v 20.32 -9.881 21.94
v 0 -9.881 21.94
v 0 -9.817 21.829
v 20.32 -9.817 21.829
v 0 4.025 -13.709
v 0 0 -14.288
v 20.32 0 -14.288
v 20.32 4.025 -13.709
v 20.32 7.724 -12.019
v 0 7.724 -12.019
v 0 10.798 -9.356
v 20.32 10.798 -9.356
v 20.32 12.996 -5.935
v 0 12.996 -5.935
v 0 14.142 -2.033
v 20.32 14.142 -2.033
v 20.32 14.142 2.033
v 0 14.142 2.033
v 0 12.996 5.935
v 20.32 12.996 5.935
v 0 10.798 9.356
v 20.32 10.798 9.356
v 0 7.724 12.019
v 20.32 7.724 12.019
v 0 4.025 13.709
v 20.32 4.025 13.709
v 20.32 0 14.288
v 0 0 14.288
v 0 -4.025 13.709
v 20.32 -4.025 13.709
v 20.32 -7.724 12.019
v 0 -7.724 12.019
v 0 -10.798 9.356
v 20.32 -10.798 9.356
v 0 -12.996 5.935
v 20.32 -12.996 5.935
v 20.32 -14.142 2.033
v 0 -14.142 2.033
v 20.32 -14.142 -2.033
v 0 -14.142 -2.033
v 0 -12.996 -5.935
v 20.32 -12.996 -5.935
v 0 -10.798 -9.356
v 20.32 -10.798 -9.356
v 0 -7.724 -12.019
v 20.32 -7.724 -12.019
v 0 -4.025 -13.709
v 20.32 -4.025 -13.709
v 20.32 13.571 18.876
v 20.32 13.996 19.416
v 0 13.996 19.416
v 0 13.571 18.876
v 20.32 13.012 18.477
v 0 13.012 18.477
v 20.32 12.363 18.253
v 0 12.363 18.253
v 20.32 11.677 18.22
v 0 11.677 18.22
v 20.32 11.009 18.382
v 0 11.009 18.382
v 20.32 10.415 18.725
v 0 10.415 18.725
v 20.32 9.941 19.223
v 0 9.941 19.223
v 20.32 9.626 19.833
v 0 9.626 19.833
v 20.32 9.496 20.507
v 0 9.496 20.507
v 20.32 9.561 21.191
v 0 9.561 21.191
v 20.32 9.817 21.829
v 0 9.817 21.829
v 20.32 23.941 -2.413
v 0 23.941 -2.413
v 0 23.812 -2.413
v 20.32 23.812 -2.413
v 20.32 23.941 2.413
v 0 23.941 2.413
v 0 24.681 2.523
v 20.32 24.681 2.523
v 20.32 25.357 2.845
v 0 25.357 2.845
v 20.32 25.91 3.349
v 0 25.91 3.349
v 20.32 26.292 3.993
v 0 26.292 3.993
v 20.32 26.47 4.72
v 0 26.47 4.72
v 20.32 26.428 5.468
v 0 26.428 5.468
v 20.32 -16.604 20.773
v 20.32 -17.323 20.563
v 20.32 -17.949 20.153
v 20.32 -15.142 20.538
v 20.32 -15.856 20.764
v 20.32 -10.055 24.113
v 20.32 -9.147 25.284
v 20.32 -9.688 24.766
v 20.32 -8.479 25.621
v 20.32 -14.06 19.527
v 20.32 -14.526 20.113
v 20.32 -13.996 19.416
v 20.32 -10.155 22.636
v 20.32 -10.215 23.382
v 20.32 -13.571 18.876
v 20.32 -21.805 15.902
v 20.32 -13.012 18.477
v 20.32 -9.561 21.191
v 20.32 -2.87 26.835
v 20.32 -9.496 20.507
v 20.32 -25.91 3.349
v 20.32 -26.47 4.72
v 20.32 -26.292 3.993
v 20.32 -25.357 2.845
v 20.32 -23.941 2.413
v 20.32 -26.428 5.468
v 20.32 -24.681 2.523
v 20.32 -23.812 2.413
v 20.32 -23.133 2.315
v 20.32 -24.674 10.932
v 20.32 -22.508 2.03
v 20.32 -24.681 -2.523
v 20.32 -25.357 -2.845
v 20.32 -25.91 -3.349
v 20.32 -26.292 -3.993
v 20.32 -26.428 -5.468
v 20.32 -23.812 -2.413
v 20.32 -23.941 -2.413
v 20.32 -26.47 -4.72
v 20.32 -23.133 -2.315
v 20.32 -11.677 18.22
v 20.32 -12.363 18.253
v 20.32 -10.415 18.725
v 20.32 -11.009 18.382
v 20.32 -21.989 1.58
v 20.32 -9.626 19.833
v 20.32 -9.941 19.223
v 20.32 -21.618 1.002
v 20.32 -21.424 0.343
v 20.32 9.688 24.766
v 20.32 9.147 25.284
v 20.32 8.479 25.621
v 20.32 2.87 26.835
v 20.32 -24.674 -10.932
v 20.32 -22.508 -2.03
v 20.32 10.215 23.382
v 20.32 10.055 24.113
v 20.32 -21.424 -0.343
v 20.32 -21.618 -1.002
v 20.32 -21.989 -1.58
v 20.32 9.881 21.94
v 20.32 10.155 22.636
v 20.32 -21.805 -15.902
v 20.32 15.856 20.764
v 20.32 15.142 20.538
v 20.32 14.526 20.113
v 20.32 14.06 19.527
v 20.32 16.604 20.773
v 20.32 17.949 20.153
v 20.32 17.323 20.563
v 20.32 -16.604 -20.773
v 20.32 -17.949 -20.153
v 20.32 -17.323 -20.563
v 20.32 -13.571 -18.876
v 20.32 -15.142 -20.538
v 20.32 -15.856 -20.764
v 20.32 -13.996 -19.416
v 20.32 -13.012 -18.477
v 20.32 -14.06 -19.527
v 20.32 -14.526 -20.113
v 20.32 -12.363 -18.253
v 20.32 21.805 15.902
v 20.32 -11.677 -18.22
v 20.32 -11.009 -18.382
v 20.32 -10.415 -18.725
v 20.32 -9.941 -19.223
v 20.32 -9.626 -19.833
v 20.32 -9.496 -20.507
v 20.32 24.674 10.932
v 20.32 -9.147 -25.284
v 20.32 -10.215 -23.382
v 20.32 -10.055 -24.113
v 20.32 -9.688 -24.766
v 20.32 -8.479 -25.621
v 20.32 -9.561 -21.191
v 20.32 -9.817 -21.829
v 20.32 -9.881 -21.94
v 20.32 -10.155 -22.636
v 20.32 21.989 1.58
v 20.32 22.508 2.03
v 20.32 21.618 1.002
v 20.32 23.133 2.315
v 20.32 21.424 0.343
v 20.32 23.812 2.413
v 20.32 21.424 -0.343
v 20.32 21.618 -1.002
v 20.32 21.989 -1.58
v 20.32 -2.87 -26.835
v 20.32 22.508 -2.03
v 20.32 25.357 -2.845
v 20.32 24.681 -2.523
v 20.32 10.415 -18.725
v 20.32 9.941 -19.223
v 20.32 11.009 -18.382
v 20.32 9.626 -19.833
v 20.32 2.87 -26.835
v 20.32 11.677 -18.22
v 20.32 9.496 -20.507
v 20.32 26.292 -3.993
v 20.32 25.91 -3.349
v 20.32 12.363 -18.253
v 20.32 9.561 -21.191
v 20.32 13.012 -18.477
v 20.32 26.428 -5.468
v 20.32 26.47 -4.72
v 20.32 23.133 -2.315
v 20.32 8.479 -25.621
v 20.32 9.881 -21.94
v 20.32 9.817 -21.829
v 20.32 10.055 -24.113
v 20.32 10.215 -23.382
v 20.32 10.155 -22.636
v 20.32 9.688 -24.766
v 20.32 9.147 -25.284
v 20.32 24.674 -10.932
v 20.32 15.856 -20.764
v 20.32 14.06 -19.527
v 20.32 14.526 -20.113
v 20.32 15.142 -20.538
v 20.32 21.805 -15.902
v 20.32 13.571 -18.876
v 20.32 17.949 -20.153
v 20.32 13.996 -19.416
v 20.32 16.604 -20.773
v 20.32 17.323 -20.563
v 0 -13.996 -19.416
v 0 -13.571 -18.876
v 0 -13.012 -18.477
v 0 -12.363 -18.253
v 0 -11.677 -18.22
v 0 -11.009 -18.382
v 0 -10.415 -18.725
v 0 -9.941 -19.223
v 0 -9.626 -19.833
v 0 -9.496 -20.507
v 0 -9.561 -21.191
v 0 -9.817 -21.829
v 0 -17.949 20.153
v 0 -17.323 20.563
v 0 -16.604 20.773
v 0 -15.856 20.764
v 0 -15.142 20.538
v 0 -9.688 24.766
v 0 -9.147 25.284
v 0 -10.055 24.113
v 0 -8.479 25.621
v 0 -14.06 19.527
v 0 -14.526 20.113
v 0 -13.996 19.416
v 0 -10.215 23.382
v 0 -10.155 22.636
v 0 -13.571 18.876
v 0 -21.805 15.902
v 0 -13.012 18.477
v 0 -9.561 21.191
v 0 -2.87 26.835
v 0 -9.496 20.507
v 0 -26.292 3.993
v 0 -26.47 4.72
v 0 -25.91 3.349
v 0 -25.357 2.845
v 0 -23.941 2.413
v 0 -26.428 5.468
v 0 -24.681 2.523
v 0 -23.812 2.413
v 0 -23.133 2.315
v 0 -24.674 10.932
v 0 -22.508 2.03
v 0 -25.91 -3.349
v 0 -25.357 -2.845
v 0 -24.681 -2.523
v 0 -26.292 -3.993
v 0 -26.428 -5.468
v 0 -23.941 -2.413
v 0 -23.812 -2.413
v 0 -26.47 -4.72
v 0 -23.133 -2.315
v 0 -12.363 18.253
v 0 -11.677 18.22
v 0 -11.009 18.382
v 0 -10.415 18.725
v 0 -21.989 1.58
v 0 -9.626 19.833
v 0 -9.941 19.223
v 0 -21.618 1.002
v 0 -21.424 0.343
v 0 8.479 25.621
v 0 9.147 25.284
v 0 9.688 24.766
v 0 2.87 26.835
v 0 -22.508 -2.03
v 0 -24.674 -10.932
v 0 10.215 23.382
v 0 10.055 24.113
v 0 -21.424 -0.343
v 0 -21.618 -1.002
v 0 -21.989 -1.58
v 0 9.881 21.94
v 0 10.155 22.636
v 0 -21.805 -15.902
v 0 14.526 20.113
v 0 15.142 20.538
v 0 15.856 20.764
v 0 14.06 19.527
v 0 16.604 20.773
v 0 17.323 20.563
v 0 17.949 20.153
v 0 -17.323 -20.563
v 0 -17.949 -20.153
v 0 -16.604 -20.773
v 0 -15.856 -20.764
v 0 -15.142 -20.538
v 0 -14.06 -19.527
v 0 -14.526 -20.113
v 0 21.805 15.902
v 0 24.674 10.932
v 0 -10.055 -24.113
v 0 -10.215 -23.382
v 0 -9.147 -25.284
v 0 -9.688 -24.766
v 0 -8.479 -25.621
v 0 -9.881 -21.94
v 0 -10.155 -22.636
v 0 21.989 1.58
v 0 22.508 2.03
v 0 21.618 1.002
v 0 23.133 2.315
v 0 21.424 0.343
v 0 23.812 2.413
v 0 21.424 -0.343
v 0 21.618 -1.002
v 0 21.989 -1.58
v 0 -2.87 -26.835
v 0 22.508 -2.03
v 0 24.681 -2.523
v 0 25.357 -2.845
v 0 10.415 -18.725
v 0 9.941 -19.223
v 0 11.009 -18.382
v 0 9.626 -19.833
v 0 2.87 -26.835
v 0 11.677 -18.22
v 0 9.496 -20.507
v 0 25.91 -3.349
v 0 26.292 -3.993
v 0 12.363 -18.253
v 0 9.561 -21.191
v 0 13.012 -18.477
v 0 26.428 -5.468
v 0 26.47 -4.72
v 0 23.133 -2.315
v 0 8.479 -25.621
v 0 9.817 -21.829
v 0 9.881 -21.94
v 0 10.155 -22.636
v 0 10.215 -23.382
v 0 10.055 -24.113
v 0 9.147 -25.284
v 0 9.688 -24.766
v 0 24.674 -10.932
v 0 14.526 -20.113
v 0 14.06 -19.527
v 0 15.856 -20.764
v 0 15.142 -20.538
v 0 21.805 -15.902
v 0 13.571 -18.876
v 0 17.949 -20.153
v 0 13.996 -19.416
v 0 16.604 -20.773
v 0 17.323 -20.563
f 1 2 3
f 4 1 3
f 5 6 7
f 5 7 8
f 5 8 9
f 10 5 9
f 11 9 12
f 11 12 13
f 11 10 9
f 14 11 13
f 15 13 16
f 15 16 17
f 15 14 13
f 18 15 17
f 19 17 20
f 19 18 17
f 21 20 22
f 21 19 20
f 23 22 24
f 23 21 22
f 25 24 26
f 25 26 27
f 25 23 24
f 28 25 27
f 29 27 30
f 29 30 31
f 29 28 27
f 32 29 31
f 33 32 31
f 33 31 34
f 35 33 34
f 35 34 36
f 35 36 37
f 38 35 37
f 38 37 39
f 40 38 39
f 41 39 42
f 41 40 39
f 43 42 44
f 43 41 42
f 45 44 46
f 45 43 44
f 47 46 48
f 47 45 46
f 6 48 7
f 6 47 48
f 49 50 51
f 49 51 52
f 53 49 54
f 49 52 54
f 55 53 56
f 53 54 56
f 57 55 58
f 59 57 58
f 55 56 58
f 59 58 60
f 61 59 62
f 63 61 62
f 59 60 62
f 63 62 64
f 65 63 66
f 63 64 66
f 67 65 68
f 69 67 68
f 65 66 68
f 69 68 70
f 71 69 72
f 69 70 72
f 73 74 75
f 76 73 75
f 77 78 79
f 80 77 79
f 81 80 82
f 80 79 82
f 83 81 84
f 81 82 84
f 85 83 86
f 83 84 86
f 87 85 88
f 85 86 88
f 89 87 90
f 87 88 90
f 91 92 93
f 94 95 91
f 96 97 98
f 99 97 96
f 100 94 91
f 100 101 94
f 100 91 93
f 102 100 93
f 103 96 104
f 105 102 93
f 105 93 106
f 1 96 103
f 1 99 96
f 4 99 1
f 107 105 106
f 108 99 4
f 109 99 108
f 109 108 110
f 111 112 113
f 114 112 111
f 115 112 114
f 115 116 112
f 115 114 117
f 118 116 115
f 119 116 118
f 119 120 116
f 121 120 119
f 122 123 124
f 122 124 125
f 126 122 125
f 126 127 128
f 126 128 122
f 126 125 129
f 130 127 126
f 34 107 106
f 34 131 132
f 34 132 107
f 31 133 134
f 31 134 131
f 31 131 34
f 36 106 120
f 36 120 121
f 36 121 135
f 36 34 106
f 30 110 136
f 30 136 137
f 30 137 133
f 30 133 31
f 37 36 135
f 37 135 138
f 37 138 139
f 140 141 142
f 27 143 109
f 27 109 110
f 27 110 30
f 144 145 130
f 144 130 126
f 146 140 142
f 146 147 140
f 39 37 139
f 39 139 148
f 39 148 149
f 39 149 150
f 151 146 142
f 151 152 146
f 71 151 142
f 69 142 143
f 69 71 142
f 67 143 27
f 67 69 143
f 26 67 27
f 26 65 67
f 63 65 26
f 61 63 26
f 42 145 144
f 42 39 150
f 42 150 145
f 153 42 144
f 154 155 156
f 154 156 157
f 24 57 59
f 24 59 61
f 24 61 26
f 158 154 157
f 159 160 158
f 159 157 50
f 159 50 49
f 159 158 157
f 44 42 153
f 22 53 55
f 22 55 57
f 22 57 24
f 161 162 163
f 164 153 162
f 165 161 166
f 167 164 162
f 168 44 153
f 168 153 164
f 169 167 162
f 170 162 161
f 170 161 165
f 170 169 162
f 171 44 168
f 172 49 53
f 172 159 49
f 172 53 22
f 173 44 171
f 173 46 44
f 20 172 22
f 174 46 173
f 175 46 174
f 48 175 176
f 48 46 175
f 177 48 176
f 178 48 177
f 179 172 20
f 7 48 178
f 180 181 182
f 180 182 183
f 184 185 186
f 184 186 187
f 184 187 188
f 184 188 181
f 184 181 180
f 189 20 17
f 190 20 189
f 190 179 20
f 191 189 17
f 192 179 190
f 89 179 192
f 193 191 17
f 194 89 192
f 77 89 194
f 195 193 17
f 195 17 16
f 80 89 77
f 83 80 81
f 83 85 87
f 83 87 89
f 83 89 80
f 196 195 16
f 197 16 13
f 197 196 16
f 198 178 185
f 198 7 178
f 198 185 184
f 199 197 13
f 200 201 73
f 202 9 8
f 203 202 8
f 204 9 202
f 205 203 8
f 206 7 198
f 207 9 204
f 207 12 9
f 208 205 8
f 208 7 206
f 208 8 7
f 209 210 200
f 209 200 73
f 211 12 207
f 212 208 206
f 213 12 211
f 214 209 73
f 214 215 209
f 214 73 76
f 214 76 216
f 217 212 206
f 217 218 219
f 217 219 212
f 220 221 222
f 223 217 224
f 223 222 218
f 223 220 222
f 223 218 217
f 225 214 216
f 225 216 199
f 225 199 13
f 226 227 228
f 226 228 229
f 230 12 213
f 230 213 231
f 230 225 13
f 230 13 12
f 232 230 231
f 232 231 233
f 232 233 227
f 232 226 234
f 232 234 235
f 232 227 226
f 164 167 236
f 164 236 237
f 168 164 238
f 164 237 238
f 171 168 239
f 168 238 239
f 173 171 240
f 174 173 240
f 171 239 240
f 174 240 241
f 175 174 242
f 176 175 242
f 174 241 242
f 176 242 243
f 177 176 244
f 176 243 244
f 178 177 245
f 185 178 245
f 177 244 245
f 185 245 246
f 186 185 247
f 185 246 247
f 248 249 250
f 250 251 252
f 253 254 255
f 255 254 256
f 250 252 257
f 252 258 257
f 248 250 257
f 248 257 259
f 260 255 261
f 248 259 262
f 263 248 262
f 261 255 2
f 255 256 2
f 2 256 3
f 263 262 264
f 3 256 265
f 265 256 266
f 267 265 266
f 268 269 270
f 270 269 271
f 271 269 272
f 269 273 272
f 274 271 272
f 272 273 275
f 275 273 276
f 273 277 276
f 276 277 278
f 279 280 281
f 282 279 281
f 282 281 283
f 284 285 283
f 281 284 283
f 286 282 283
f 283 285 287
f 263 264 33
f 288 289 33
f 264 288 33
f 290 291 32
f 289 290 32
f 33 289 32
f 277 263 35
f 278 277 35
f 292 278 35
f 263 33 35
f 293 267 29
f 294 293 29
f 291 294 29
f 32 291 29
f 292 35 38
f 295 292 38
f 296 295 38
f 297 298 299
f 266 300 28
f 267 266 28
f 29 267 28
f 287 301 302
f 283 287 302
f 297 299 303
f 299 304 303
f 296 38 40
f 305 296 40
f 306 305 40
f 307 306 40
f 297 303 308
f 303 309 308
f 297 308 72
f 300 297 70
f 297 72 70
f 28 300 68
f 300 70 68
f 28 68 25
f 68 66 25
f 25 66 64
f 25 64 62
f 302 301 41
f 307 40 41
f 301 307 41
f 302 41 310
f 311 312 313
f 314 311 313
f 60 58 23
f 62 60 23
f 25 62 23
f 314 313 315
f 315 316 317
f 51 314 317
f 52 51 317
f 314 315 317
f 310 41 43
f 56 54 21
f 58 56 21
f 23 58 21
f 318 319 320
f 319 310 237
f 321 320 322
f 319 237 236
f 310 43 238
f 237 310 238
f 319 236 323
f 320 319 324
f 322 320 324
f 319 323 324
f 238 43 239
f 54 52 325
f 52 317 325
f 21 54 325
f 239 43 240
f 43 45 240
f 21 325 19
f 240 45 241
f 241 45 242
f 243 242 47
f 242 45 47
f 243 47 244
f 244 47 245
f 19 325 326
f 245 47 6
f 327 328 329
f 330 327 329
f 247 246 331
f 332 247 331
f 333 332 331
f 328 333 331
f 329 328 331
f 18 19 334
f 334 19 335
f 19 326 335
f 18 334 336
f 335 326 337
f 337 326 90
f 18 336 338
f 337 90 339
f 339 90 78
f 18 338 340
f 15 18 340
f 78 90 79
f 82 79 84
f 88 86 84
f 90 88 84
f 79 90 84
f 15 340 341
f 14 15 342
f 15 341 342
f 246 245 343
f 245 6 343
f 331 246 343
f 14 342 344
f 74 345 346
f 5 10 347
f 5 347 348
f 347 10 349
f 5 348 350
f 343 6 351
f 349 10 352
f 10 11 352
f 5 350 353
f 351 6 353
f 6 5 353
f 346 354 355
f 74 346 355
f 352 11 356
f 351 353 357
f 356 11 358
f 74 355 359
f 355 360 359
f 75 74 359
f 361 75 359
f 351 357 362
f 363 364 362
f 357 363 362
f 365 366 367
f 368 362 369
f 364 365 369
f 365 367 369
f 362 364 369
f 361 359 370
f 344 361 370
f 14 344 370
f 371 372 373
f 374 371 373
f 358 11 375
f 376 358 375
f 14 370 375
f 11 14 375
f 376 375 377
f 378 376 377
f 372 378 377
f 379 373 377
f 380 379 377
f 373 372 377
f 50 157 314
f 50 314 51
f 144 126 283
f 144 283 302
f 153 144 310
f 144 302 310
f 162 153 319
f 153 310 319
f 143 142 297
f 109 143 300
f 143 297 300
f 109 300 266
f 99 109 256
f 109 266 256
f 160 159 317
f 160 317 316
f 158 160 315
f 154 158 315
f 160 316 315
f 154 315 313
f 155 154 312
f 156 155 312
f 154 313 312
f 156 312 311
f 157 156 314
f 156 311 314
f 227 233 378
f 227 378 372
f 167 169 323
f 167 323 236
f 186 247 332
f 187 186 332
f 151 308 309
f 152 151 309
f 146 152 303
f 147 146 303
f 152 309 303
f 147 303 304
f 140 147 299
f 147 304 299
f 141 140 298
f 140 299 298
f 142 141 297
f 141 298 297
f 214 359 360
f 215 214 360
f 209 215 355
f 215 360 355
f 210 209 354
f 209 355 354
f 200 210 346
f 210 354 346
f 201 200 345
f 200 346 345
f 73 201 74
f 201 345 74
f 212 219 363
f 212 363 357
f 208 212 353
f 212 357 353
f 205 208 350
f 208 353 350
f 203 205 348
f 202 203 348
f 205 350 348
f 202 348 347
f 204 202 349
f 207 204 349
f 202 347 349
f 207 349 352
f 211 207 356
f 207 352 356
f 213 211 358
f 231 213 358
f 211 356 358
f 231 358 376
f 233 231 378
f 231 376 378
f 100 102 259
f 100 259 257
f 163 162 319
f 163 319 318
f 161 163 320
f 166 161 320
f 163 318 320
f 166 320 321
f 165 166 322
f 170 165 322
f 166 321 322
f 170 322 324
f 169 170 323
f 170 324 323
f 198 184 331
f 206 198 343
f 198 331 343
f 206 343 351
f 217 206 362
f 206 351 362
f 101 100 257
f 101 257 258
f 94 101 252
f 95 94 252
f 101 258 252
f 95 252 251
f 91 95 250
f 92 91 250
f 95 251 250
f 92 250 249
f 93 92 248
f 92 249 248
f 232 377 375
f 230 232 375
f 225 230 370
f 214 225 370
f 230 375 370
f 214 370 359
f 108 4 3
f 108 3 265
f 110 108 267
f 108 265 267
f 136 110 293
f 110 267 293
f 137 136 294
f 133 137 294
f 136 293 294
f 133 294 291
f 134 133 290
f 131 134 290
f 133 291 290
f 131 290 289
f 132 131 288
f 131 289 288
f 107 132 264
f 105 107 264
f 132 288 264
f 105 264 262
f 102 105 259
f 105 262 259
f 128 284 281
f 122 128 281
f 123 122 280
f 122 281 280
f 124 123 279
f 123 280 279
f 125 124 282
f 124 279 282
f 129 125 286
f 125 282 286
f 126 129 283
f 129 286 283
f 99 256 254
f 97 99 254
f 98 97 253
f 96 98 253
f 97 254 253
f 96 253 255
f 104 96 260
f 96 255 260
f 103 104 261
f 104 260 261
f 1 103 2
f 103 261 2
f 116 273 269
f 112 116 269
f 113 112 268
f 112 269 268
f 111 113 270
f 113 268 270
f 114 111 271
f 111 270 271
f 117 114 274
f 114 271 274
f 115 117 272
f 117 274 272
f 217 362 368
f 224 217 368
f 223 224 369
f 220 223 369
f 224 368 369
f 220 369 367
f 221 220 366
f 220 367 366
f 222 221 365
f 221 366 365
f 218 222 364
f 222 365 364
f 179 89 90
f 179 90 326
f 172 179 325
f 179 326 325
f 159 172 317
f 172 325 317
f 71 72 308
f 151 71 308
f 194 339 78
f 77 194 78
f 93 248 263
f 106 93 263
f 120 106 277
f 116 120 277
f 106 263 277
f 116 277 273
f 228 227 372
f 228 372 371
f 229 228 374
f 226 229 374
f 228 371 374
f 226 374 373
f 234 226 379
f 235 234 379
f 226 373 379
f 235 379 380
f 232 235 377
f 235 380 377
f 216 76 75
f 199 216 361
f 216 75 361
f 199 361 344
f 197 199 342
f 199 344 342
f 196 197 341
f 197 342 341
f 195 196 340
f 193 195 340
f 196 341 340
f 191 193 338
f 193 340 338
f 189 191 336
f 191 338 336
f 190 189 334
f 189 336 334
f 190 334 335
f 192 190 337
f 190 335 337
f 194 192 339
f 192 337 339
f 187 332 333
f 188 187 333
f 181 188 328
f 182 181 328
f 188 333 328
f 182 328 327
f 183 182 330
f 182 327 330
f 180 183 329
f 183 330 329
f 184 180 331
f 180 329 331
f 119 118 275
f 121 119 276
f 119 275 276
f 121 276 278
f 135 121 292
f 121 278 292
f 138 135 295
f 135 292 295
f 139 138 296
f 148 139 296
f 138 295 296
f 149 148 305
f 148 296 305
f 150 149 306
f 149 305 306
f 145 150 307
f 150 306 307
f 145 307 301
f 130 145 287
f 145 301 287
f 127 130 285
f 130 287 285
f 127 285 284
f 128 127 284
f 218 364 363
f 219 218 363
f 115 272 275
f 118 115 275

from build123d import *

# Parameters (mm, degrees)
SKETCH1_R           = 14.2875
BOSS_EXTRUDE1_DEPTH = 20.32


with BuildPart() as part:
    # Sketch1 → Boss-Extrude1 (new body)
    with BuildSketch(Plane(origin=(0, 0, 0), x_dir=(0, 0, -1), z_dir=(1, 0, 0))):
        with BuildLine():
            Line((-2.413, 23.8125), (-2.413, 23.940510589))
            ThreePointArc((-2.413, 23.940510589), (-3.349172921, 25.91011428), (-5.467597403, 26.427836364))
            ThreePointArc((-5.467597403, 26.427836364), (-13.49375, 23.371860585), (-20.153378957, 17.94899643))
            ThreePointArc((-20.153378957, 17.94899643), (-20.764230721, 15.855525972), (-19.526590349, 14.059974594))
            Line((-19.526590349, 14.059974594), (-19.415729928, 13.995969299))
            ThreePointArc((-19.415729928, 13.995969299), (-18.532510628, 10.69975), (-21.828729928, 9.816530701))
            Line((-21.828729928, 9.816530701), (-21.939590349, 9.880535995))
            ThreePointArc((-21.939590349, 9.880535995), (-24.113403642, 10.054588309), (-25.62097636, 8.478839934))
            ThreePointArc((-25.62097636, 8.478839934), (-26.9875, 0), (-25.62097636, -8.478839934))
            ThreePointArc((-25.62097636, -8.478839934), (-24.113403642, -10.054588309), (-21.939590349, -9.880535995))
            Line((-21.939590349, -9.880535995), (-21.828729928, -9.816530701))
            ThreePointArc((-21.828729928, -9.816530701), (-18.532510628, -10.69975), (-19.415729928, -13.995969299))
            Line((-19.415729928, -13.995969299), (-19.526590349, -14.059974594))
            ThreePointArc((-19.526590349, -14.059974594), (-20.764230721, -15.855525972), (-20.153378957, -17.94899643))
            ThreePointArc((-20.153378957, -17.94899643), (-13.49375, -23.371860585), (-5.467597403, -26.427836364))
            ThreePointArc((-5.467597403, -26.427836364), (-3.349172921, -25.91011428), (-2.413, -23.940510589))
            Line((-2.413, -23.940510589), (-2.413, -23.8125))
            ThreePointArc((-2.413, -23.8125), (0, -21.3995), (2.413, -23.8125))
            Line((2.413, -23.8125), (2.413, -23.940510589))
            ThreePointArc((2.413, -23.940510589), (3.349172921, -25.91011428), (5.467597403, -26.427836364))
            ThreePointArc((5.467597403, -26.427836364), (13.49375, -23.371860585), (20.153378957, -17.94899643))
            ThreePointArc((20.153378957, -17.94899643), (20.764230721, -15.855525972), (19.526590349, -14.059974594))
            Line((19.526590349, -14.059974594), (19.415729928, -13.995969299))
            ThreePointArc((19.415729928, -13.995969299), (18.532510628, -10.69975), (21.828729928, -9.816530701))
            Line((21.828729928, -9.816530701), (21.939590349, -9.880535995))
            ThreePointArc((21.939590349, -9.880535995), (24.113403642, -10.054588309), (25.62097636, -8.478839934))
            ThreePointArc((25.62097636, -8.478839934), (26.9875, 0), (25.62097636, 8.478839934))
            ThreePointArc((25.62097636, 8.478839934), (24.113403642, 10.054588309), (21.939590349, 9.880535995))
            Line((21.939590349, 9.880535995), (21.828729928, 9.816530701))
            ThreePointArc((21.828729928, 9.816530701), (18.532510628, 10.69975), (19.415729928, 13.995969299))
            Line((19.415729928, 13.995969299), (19.526590349, 14.059974594))
            ThreePointArc((19.526590349, 14.059974594), (20.764230721, 15.855525972), (20.153378957, 17.94899643))
            ThreePointArc((20.153378957, 17.94899643), (13.49375, 23.371860585), (5.467597403, 26.427836364))
            ThreePointArc((5.467597403, 26.427836364), (3.349172921, 25.91011428), (2.413, 23.940510589))
            Line((2.413, 23.940510589), (2.413, 23.8125))
            ThreePointArc((2.413, 23.8125), (0, 21.3995), (-2.413, 23.8125))
        make_face()
        Circle(SKETCH1_R, mode=Mode.SUBTRACT)
    extrude(amount=BOSS_EXTRUDE1_DEPTH)


solid = part.part
